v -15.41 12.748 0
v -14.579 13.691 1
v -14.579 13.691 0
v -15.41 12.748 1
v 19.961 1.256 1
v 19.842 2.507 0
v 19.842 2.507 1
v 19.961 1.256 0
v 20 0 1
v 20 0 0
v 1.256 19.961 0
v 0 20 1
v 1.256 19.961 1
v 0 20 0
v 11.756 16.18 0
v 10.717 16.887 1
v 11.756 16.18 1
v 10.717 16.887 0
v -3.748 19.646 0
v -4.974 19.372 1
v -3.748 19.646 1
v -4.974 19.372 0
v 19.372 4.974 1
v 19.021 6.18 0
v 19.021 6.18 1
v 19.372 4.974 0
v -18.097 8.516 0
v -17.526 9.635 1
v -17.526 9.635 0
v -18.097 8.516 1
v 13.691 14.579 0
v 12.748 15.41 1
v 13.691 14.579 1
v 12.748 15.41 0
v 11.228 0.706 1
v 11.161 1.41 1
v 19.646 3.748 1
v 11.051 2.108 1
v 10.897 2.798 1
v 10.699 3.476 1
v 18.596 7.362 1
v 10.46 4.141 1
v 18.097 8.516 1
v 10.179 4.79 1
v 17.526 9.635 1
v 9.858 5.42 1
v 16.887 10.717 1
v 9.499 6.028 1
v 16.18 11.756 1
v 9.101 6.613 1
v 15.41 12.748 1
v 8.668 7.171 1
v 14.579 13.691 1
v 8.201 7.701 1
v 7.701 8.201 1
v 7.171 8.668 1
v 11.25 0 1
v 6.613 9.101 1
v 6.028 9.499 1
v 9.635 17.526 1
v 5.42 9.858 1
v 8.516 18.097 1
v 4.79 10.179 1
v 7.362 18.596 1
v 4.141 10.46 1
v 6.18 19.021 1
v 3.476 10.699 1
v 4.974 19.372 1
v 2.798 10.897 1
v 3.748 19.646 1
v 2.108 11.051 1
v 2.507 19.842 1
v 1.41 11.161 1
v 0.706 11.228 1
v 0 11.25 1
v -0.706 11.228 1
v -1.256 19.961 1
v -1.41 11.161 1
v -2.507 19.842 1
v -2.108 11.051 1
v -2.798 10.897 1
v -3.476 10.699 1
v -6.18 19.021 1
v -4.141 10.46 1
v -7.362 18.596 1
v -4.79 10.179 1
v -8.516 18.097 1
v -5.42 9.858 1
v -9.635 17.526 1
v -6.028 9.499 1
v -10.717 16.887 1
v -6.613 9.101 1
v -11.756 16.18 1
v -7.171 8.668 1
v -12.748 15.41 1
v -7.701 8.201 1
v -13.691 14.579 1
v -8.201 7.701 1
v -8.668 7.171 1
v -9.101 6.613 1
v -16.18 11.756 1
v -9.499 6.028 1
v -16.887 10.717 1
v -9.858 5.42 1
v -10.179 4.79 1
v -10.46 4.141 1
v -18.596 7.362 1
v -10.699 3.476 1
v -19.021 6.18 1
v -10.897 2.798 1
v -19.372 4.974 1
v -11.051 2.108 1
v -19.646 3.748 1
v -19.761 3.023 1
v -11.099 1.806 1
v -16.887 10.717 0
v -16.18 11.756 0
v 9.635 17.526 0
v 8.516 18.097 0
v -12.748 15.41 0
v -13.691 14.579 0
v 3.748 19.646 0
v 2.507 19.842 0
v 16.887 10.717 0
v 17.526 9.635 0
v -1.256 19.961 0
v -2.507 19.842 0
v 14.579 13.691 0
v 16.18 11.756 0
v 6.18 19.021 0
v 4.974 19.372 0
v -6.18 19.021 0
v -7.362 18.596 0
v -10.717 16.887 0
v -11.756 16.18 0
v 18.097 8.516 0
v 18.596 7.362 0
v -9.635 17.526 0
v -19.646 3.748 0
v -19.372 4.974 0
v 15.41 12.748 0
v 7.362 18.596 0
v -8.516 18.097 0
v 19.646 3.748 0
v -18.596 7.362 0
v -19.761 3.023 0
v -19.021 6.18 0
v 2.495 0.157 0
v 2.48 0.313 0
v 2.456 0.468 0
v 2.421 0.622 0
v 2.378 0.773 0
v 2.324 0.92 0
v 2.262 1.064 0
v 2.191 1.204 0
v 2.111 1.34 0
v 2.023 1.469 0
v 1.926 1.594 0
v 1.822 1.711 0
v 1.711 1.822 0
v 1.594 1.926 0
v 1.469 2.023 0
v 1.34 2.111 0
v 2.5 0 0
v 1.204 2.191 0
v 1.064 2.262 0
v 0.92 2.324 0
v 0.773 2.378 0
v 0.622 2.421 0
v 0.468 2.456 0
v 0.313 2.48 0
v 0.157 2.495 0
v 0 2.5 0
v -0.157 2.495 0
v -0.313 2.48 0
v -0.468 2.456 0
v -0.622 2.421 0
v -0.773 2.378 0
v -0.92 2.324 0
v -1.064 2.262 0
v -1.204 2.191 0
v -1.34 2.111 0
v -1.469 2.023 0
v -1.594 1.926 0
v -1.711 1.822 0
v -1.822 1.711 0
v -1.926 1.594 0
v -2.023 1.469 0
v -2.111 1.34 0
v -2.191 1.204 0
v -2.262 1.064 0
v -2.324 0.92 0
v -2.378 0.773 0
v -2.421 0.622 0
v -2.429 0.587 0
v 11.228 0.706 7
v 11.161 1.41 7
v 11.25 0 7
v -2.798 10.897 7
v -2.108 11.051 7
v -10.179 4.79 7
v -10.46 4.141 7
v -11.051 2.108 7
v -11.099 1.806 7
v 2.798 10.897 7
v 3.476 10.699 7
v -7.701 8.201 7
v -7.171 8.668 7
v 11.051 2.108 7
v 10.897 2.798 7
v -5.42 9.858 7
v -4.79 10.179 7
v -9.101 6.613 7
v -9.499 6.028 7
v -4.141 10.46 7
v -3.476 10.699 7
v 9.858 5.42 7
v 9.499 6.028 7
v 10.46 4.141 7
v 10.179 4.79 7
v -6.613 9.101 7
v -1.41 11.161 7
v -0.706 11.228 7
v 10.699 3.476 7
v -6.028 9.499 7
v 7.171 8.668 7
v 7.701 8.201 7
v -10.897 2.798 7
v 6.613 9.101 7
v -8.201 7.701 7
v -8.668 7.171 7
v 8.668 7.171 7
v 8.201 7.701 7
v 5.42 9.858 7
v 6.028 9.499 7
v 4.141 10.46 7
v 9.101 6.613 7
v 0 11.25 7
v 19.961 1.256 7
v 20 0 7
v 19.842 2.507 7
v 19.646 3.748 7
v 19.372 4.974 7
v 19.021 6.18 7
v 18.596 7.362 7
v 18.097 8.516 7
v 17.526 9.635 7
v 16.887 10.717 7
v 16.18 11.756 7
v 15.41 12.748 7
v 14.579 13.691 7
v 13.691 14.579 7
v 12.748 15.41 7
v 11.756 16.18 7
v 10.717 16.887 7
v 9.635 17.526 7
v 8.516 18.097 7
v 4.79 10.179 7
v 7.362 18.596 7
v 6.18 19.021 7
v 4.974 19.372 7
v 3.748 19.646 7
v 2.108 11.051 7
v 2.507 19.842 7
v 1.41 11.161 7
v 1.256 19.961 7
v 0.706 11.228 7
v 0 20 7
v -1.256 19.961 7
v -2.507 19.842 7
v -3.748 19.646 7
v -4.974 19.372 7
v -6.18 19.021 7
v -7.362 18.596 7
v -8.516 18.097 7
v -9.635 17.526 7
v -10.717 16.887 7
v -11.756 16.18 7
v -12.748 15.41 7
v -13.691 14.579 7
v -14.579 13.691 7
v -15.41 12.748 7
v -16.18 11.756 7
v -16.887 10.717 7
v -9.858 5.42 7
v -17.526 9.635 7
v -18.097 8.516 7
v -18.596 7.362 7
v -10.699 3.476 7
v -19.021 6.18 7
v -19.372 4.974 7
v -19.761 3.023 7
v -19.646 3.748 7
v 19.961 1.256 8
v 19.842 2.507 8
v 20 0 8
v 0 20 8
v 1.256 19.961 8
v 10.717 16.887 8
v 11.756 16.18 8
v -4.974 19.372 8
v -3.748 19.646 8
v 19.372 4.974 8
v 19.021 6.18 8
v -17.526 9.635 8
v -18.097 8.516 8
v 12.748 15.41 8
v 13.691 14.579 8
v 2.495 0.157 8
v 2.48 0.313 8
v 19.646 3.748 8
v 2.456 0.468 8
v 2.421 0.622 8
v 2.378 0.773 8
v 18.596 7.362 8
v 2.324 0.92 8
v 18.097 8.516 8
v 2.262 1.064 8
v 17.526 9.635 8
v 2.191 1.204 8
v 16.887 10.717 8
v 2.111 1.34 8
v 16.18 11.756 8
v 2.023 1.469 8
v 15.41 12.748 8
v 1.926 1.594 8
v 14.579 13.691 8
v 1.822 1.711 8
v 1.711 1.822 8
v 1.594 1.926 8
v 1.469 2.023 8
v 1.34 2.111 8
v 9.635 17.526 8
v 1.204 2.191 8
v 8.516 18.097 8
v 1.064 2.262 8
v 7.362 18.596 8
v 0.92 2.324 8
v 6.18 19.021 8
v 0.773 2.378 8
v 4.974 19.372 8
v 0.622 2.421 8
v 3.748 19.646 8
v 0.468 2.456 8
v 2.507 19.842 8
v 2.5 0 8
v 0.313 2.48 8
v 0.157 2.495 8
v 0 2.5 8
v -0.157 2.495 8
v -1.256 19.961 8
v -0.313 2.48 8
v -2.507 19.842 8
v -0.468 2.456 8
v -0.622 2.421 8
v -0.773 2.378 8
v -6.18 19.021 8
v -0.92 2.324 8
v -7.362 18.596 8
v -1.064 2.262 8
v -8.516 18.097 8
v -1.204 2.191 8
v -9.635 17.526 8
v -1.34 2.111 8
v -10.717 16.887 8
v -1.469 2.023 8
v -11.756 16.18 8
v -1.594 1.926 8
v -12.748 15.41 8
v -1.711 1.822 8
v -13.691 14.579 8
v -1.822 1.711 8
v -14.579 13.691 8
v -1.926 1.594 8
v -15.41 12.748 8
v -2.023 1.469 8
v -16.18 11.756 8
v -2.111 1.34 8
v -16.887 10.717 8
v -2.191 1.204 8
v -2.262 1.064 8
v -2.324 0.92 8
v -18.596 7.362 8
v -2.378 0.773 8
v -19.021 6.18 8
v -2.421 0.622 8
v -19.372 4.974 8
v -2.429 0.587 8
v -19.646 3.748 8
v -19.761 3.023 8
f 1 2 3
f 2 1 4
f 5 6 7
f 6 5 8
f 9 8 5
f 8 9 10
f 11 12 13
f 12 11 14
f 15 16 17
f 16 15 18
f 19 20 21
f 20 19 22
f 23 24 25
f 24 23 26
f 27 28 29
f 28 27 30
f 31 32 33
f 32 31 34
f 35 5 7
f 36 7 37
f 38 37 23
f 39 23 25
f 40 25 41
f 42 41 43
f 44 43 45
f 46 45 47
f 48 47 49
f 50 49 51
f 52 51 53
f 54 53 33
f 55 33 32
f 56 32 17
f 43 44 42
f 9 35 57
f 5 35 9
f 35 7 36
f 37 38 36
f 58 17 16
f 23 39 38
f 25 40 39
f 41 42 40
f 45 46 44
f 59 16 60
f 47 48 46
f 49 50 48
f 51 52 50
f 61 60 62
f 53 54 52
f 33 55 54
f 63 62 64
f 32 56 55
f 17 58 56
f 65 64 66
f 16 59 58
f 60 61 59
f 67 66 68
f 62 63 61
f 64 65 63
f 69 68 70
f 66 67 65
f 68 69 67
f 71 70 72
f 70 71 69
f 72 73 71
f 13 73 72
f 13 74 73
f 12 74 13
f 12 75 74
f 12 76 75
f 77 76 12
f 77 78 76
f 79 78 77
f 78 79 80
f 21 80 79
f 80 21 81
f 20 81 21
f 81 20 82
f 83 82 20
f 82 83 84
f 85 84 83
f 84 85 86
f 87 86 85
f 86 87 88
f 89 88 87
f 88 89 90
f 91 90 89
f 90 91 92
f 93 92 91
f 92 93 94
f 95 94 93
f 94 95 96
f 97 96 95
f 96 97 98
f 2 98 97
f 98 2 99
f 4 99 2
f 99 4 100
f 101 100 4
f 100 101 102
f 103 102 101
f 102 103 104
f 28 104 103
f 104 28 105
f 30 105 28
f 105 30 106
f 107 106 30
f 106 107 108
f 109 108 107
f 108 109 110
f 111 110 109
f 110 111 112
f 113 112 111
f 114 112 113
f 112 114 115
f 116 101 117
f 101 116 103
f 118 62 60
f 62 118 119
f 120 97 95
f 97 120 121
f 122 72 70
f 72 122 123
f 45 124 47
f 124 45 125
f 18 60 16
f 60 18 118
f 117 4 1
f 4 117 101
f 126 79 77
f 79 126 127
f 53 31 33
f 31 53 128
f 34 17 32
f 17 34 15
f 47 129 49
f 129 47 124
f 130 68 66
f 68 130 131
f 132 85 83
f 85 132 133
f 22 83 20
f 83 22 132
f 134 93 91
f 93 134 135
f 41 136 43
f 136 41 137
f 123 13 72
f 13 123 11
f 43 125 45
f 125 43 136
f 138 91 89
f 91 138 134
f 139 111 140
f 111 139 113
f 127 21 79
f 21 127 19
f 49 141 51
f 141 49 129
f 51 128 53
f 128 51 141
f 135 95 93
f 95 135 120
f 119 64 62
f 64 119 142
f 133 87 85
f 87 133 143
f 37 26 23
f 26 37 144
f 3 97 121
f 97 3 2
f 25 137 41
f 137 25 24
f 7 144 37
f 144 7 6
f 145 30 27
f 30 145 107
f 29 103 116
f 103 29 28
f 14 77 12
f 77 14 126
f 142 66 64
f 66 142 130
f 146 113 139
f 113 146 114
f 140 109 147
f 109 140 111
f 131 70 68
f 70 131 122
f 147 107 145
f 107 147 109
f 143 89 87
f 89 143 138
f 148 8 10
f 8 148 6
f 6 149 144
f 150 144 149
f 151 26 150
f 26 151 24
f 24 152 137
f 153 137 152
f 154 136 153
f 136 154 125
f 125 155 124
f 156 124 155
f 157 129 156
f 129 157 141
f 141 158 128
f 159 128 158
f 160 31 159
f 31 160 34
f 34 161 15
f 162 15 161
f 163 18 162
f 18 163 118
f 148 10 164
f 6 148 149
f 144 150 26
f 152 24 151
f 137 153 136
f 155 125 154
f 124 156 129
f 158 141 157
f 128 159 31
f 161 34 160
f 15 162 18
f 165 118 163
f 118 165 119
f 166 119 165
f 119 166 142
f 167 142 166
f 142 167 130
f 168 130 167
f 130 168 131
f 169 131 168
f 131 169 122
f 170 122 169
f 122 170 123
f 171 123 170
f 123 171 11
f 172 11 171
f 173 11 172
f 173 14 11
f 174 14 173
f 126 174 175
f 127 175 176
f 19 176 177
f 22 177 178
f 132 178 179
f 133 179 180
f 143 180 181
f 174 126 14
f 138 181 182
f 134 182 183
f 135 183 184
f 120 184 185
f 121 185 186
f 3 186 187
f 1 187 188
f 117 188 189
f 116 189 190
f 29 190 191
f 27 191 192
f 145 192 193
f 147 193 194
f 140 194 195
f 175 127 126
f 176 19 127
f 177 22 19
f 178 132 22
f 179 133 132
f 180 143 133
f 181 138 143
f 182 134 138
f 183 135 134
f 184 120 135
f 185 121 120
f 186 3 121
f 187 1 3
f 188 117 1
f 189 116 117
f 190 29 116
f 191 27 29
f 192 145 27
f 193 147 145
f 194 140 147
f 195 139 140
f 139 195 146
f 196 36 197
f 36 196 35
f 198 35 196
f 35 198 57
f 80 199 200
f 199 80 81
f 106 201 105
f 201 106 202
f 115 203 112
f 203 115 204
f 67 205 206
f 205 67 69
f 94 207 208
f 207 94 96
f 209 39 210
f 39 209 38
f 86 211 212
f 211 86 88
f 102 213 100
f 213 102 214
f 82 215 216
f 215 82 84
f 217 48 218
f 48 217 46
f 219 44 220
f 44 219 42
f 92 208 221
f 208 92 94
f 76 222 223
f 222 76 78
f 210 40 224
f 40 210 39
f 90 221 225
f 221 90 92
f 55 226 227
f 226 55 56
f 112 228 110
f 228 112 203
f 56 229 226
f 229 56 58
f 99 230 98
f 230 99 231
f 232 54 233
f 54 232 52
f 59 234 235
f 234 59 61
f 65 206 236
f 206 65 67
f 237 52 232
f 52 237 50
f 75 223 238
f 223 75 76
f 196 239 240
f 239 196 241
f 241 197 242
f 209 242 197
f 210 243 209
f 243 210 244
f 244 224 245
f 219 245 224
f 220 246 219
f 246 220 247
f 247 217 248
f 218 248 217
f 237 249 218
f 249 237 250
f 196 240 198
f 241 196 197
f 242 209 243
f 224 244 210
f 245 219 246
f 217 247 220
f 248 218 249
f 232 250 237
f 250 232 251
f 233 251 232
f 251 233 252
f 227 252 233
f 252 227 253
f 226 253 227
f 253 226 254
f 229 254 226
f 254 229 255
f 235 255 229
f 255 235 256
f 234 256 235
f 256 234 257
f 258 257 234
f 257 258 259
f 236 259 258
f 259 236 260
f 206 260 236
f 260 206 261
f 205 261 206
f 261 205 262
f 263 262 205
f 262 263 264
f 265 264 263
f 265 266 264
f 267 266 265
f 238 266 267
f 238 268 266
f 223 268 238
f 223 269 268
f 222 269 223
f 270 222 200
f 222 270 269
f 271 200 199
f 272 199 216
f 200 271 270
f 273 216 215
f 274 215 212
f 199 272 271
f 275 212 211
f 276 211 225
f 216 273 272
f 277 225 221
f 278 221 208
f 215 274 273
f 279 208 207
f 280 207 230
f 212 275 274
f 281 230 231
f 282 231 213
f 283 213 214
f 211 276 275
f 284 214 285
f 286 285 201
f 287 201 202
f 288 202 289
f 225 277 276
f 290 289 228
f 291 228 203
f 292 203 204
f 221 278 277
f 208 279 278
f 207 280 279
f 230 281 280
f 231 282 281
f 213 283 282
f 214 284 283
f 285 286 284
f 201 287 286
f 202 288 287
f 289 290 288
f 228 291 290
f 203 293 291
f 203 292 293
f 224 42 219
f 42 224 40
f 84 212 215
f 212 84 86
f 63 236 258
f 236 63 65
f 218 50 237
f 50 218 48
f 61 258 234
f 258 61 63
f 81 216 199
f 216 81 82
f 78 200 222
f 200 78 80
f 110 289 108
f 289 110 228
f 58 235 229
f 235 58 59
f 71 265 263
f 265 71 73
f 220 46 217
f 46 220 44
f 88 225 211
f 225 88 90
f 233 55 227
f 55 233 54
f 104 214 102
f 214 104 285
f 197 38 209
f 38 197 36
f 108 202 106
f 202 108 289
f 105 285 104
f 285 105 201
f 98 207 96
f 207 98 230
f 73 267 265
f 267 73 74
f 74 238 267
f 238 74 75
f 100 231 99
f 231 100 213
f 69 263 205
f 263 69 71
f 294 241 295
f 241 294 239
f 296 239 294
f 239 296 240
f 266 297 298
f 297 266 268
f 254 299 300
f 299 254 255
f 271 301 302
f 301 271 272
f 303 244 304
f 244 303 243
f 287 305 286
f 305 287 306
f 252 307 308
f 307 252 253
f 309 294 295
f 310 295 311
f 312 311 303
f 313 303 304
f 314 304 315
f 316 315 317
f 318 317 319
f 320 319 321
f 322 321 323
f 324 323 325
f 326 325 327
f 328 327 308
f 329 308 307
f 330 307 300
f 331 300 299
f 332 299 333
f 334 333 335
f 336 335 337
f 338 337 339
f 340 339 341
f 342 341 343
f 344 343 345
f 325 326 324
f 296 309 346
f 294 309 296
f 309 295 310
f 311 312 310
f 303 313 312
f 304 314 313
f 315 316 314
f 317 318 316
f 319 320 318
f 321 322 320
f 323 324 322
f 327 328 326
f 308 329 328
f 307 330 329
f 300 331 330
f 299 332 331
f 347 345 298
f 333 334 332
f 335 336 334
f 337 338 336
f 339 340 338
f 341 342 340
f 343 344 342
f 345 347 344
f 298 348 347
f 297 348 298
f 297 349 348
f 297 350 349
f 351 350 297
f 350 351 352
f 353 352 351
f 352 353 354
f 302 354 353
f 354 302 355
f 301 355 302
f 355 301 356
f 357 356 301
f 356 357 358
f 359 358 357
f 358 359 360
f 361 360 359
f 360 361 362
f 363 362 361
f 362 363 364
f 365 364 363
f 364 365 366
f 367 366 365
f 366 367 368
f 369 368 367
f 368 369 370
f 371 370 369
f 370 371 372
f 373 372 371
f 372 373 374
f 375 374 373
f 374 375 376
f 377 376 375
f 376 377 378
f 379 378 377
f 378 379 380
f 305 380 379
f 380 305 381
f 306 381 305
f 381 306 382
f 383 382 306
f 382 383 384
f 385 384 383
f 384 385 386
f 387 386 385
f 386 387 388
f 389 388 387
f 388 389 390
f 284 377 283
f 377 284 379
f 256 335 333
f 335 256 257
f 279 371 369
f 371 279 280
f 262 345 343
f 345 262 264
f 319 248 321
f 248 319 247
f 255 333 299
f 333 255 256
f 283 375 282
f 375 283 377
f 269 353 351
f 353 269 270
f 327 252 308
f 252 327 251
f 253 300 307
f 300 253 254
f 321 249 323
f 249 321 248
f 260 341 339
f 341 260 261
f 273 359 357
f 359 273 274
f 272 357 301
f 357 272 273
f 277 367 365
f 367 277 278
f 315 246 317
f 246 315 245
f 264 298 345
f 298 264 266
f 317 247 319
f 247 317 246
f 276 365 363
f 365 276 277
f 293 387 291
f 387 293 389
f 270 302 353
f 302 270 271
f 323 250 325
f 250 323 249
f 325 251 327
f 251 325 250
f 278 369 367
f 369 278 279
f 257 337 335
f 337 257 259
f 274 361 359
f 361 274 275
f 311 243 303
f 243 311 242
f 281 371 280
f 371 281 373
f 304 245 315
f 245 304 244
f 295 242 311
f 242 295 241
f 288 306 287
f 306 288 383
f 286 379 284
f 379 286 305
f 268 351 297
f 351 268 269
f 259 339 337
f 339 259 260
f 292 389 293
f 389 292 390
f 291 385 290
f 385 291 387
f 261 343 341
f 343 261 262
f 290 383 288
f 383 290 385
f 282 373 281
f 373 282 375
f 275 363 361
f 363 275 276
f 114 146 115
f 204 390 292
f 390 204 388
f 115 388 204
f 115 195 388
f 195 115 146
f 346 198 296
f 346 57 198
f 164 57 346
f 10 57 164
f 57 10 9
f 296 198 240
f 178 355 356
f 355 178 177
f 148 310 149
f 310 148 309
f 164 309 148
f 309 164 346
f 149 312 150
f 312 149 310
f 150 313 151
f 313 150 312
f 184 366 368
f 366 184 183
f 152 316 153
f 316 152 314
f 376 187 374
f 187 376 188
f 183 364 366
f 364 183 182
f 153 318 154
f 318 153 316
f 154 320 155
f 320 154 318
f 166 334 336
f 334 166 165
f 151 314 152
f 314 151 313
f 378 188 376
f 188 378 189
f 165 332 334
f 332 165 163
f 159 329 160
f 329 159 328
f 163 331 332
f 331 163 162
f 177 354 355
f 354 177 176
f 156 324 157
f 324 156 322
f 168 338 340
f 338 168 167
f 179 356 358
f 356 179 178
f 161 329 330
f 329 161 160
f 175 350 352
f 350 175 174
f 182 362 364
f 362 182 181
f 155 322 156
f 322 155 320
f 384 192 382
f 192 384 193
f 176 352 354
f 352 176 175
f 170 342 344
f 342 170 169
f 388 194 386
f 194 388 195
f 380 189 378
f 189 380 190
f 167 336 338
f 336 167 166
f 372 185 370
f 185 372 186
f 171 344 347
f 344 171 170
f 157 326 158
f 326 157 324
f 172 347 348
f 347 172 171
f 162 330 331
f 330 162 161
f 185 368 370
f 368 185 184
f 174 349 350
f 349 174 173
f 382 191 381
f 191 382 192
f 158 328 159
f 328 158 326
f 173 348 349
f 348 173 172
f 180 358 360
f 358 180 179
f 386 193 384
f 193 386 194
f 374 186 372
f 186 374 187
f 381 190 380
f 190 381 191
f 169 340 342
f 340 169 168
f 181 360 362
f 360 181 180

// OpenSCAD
// Elevevator Support for RM F104
/* This makes a 3D model for a support for the elevator on the tail.
 * The parameters are given below in mm.
 * The construction method is:
 * 1. make a circular plate,
 * 2. put a circular insert on top of it
 * 3. put another circular plate on top of that.
 * 4. then from all that subtract:
 *    4a. a rod of correct diameter, correctly positioned,
 *    4b. 2 cubes that have been rotated to the proper angles and postioned correctly.
 * 5. the end result is produced by the call to 'support();'
 */

// all dimensions are millimeters
rodDia = 5.0;  // diameter of rod to be glued to support
foamThickness = 8.0;  // foam thickness so as to make it flush
plateThickness = 1.0;  // support plates sandwich walls
plateDia = 40.0;   // diameter of plate
insertThickness = foamThickness - 2.0*plateThickness;  // width of the inner piece
insertDia = (plateDia + rodDia)/2.0;  // diameter of inner piece
forAngle = -8.0;  // angle of forward slope
aftAngle = 0.0;  // angle of rearward slope

// do not change these!
epsilon = 10.0;  // used to ensure that there are no close misses
$fn = 100;  // curve resolution

module outerPlate(dia, ht){
    cylinder(d=dia,h=ht);
}

module insert(d,t){
    cylinder(d=d,h=t);
}

module rod(d,ht){
    translate([0,0,0]){
        cylinder(d=d,h=ht,center=true);
    }
}

module cutter(d,h){
    translate([0,-(d+epsilon)/2.0,0]){
        union(){
            rotate(forAngle){
                cube(d+epsilon,+epsilon,h+epsilon,center=true);
            }
            rotate(aftAngle){
                cube(d+epsilon,+epsilon,h+epsilon,center=true);
            }
        }
    }
}
module support(){
    difference(){
        union(){
            outerPlate(plateDia,plateThickness);
            translate([0,0,plateThickness]){
                insert(insertDia,insertThickness);
            }
            translate([0,0,plateThickness+insertThickness]){
                outerPlate(plateDia,plateThickness);
            }
        }
        cutter(plateDia,foamThickness*2.0);
        rod(rodDia,foamThickness*3.0);
    }
}
support();
